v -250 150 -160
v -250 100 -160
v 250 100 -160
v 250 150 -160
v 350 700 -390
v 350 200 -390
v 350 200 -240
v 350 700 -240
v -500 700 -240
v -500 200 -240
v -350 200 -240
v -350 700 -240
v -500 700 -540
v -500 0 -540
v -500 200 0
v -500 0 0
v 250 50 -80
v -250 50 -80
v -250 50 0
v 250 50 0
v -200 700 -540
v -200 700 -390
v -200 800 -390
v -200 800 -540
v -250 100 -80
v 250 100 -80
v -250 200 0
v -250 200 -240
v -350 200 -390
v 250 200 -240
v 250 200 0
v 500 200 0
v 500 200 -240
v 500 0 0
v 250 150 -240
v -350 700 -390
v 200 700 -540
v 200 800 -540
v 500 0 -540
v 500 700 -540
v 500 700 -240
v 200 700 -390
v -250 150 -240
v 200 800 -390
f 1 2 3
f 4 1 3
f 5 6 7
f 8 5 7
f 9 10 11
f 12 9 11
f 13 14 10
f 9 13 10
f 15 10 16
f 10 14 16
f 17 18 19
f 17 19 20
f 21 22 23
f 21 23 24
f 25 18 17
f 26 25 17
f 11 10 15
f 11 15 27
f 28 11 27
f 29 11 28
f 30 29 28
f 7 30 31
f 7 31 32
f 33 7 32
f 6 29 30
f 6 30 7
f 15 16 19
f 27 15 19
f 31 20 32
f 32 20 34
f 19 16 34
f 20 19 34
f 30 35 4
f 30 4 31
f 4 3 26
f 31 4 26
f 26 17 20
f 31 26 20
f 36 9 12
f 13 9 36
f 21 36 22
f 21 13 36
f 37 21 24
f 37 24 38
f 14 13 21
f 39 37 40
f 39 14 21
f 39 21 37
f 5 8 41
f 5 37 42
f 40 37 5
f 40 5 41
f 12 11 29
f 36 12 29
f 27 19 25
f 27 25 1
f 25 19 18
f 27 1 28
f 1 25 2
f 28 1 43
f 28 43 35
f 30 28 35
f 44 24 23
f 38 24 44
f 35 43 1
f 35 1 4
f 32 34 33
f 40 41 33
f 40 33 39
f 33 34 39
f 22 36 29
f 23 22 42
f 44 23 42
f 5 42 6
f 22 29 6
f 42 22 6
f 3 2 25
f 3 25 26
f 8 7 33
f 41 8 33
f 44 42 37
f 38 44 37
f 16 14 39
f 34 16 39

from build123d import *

# Parameters (mm, degrees)
BOSS_EXTRUDE1_DEPTH   = 700
BOSS_EXTRUDE1_2_DEPTH = 700
BOSS_EXTRUDE2_DEPTH   = 200
SKETCH1_4_W           = 400
SKETCH1_4_H           = 150
BOSS_EXTRUDE3_DEPTH   = 800
SKETCH1_5_W           = 500
SKETCH1_5_H           = 80
BOSS_EXTRUDE4_DEPTH   = 150
SKETCH1_6_W           = 500
SKETCH1_6_H           = 80
BOSS_EXTRUDE5_DEPTH   = 100
SKETCH1_7_W           = 500
SKETCH1_7_H           = 80
BOSS_EXTRUDE6_DEPTH   = 50


with BuildPart() as part:
    # Sketch1 → Boss-Extrude1 (new body)
    with BuildSketch(Plane(origin=(0, 0, 0), x_dir=(1, 0, 0), z_dir=(0, 1, 0))):
        Polygon((-500, 540), (-500, 240), (-350, 240), (-350, 390), (-200, 390), (-200, 540), align=None)
    extrude(amount=BOSS_EXTRUDE1_DEPTH)



with BuildPart() as body_2:
    # Sketch1 → Boss-Extrude1 2 (new body)
    with BuildSketch(Plane(origin=(0, 0, 0), x_dir=(1, 0, 0), z_dir=(0, 1, 0))):
        Polygon((350, 240), (500, 240), (500, 540), (200, 540), (200, 390), (350, 390), align=None)
    extrude(amount=BOSS_EXTRUDE1_2_DEPTH)


with BuildPart() as part_1:
    add(part.part)

    add(body_2.part)  # Boss-Extrude2 merges body 2
    # Sketch1<3> → Boss-Extrude2 (add)
    with BuildSketch(Plane(origin=(0, 0, 0), x_dir=(1, 0, 0), z_dir=(0, 1, 0))):
        Polygon((-500, 240), (-500, 0), (-250, 0), (-250, 80), (-250, 160), (-250, 240), (250, 240), (250, 160), (250, 80), (250, 0), (500, 0), (500, 240), (350, 240), (350, 390), (200, 390), (-200, 390), (-350, 390), (-350, 240), align=None)
    extrude(amount=BOSS_EXTRUDE2_DEPTH)

    # Sketch1<4> → Boss-Extrude3 (add)
    with BuildSketch(Plane(origin=(0, 0, 0), x_dir=(1, 0, 0), z_dir=(0, 1, 0))):
        with Locations((0, 465)):
            Rectangle(SKETCH1_4_W, SKETCH1_4_H)
    extrude(amount=BOSS_EXTRUDE3_DEPTH)

    # Sketch1<5> → Boss-Extrude4 (add)
    with BuildSketch(Plane(origin=(0, 0, 0), x_dir=(1, 0, 0), z_dir=(0, 1, 0))):
        with Locations((0, 200)):
            Rectangle(SKETCH1_5_W, SKETCH1_5_H)
    extrude(amount=BOSS_EXTRUDE4_DEPTH)

    # Sketch1<6> → Boss-Extrude5 (add)
    with BuildSketch(Plane(origin=(0, 0, 0), x_dir=(1, 0, 0), z_dir=(0, 1, 0))):
        with Locations((0, 120)):
            Rectangle(SKETCH1_6_W, SKETCH1_6_H)
    extrude(amount=BOSS_EXTRUDE5_DEPTH)

    # Sketch1<7> → Boss-Extrude6 (add)
    with BuildSketch(Plane(origin=(0, 0, 0), x_dir=(1, 0, 0), z_dir=(0, 1, 0))):
        with Locations((0, 40)):
            Rectangle(SKETCH1_7_W, SKETCH1_7_H)
    extrude(amount=BOSS_EXTRUDE6_DEPTH)


solid = part_1.part
